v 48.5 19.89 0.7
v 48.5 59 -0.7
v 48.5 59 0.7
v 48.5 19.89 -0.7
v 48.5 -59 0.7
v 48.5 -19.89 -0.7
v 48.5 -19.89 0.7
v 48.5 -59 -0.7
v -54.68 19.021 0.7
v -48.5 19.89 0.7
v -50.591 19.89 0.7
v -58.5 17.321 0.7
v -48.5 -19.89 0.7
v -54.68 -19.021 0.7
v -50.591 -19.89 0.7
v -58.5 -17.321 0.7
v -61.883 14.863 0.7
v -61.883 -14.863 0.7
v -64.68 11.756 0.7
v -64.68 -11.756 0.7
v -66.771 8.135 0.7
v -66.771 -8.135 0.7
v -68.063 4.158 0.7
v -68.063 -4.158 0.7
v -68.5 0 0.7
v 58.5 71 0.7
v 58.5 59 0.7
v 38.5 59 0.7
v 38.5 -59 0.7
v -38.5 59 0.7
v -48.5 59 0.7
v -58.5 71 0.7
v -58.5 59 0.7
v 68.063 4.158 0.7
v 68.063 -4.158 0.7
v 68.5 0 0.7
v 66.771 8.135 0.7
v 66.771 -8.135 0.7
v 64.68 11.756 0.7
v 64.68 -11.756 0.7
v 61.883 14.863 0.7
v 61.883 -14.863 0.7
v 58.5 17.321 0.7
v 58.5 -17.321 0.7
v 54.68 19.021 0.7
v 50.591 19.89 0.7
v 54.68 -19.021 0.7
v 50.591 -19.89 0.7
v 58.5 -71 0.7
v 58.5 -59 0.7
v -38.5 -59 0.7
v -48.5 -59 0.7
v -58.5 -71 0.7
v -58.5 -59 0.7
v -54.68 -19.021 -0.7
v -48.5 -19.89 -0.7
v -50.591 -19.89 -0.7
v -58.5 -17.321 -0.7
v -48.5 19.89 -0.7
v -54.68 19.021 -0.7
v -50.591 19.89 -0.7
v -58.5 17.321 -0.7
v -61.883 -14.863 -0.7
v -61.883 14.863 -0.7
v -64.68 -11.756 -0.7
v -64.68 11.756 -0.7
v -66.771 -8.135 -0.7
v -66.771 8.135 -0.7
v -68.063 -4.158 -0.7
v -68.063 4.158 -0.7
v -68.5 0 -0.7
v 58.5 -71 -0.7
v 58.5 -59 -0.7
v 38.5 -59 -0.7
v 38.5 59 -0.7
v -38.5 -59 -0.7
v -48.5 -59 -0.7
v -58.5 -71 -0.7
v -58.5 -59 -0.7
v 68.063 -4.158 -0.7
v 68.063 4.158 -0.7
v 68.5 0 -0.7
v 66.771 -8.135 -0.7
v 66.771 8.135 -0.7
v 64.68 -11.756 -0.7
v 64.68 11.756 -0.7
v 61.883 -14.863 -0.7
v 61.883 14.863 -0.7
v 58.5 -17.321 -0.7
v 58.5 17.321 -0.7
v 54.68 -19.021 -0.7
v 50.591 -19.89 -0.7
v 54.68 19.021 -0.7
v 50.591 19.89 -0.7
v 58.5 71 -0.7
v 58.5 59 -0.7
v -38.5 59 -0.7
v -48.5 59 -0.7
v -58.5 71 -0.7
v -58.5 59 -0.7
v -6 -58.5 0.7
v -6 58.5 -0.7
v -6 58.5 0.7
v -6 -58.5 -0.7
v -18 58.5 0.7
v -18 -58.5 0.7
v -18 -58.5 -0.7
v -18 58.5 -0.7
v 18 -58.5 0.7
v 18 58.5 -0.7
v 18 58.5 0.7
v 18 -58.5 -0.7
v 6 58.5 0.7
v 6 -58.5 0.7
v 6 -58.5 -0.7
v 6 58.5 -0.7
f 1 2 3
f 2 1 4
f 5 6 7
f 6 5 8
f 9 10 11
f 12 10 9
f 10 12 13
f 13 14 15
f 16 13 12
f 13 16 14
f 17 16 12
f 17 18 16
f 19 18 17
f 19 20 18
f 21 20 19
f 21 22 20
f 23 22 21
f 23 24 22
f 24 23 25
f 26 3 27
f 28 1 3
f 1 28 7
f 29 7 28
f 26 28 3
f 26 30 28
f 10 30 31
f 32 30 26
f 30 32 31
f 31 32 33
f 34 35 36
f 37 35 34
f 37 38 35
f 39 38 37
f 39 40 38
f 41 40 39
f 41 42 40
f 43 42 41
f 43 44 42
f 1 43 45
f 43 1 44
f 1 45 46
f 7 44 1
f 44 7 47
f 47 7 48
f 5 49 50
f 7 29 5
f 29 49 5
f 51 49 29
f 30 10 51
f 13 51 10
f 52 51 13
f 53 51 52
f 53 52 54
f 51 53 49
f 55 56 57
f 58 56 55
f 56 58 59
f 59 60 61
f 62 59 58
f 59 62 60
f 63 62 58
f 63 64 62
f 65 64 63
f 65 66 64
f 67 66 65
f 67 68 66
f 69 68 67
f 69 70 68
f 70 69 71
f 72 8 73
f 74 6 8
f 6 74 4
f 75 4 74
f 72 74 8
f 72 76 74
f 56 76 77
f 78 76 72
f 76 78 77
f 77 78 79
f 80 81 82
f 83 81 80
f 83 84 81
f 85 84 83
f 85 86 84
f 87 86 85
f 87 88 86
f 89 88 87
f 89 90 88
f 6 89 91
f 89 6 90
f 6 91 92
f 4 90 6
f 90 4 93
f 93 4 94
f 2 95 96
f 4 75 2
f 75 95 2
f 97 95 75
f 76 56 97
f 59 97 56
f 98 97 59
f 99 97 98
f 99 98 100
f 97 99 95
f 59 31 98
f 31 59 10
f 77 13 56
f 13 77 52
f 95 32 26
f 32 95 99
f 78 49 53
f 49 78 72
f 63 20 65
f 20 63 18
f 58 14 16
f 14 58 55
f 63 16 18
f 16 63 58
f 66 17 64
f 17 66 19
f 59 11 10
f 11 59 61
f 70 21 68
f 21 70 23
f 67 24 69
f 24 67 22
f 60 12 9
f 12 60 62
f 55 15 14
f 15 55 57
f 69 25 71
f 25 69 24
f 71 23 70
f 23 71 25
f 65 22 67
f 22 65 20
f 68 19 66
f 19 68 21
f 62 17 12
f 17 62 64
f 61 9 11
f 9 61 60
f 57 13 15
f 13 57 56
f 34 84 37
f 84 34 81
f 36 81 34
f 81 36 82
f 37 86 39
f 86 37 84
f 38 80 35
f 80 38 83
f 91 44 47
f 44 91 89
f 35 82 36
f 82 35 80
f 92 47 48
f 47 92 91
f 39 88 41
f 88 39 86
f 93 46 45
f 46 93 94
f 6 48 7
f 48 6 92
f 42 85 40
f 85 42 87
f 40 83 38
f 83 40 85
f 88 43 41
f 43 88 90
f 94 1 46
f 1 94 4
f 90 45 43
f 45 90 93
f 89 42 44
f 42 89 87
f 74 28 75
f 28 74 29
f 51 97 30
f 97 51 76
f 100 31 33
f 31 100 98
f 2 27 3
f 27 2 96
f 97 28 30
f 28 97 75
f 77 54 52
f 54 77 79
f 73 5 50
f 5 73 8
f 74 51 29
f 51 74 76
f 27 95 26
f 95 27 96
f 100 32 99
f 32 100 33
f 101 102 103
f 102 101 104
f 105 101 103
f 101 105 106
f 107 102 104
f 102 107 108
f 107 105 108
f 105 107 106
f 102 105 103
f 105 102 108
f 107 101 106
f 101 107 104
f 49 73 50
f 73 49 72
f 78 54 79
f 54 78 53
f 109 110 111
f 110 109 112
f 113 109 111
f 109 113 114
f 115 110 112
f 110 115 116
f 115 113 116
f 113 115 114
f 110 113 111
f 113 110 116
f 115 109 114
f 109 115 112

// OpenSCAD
width = 97; // External width (except clipping mechanism)
height = 142; // External height (except clipping mechanism)
corner_radius = 14; // Round corner at the bottom corners
top_width = 114; // Clipping mechanism width
top_height = 20; // Clipping mechanism height
thickness = 2*0.7; // Thickness of clipping mechanism
clip_height = 12;

//Main pocket
difference()
{
	union(){
	cube(size = [width,height,thickness], center = true);
	translate([-width/2, 0,0]) cylinder(r=20, h=thickness, center = true);
	translate([width/2, 0,0]) cylinder(r=20, h=thickness, center = true);
	}
	cube(size = [width-20,height-24,thickness], center = true);
}

// Existing top clip
//translate([0, height/2 + top_height/2, 0]) cube(size = [top_width,top_height,thickness], center = true);


clip_width = width +20;
// Top clip support
translate([0, height/2 - clip_height/2, 0]) cube(size = [clip_width, clip_height, thickness], center = true);

// Top clip 
translate([-clip_height, 0 , 0]) cube(size = [clip_height, clip_width, thickness], center = true);

// Bottom clip support
translate([0, -height/2+clip_height/2, 0]) cube(size = [clip_width, clip_height, thickness], center = true);

// Bottom clip
translate([clip_height, 0, 0]) cube(size = [clip_height, clip_width, thickness], center = true);
